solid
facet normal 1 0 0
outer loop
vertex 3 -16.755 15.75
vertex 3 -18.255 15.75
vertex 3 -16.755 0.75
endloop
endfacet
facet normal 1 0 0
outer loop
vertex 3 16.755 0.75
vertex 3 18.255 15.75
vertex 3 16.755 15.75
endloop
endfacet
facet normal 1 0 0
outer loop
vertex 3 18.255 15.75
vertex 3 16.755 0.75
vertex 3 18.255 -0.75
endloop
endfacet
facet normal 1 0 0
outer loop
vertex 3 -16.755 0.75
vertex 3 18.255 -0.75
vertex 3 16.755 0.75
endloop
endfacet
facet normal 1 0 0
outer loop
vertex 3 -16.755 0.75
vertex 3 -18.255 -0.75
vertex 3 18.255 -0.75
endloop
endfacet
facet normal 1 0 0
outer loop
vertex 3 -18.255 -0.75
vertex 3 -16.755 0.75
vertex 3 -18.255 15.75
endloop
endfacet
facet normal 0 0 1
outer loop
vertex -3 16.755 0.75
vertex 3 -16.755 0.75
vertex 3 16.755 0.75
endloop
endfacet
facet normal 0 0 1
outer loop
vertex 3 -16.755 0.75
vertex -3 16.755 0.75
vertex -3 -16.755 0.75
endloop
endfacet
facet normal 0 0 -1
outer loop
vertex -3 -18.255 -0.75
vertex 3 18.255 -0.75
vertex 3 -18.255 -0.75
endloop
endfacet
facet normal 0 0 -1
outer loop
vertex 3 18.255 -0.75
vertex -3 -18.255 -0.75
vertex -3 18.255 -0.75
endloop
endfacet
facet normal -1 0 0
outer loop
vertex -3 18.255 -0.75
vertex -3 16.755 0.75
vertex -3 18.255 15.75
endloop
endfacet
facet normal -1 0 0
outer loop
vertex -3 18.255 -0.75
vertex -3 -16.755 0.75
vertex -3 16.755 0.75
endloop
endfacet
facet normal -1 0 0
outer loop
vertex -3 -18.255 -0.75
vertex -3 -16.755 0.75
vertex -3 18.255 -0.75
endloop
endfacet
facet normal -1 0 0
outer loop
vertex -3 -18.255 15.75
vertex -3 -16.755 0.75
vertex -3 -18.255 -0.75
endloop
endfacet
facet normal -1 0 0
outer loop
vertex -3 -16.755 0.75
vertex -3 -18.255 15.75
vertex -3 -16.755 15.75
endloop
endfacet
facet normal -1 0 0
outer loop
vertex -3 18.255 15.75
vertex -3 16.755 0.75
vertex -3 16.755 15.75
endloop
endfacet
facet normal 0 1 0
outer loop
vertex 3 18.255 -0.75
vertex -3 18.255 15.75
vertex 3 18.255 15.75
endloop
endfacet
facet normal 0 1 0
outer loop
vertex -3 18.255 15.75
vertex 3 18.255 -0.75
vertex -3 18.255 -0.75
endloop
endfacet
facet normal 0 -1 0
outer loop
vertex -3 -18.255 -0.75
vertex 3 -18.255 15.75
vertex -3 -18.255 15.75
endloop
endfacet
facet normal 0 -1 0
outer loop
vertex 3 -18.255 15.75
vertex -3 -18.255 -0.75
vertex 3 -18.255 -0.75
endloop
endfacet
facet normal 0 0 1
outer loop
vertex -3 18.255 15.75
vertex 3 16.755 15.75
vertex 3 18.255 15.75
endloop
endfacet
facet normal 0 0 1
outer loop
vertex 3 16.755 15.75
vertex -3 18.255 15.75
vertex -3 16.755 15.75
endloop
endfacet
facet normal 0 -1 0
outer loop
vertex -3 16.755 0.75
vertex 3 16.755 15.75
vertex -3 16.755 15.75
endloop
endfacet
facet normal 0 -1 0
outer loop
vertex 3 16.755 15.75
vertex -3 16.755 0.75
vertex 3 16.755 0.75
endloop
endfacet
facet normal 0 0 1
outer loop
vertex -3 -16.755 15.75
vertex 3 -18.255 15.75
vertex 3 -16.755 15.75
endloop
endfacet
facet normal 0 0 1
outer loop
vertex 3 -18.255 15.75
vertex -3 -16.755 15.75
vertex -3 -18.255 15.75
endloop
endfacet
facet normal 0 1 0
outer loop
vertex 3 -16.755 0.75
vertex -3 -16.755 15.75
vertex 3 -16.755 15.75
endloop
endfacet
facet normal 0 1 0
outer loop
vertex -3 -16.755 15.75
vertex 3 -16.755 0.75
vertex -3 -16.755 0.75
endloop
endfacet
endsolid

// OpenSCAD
aa_w = 33.51;
button_w = 5.96 + 0.5;
t = 1.5;
d = 15;
w = 6; //button_w + 2*t;

difference(){
    cube([w, aa_w + 2*t, t], center=true);
    //translate([0, 1.5*button_w, 0])
    //cube([button_w, button_w, t], center=true);
    //translate([0, -1.5*button_w, 0])
    //cube([button_w, button_w, t], center=true);
}
translate([0, aa_w/2 + t/2, (d + t)/2])
cube([w, t, d], center=true);
translate([0, -aa_w/2 - t/2, (d + t)/2])
cube([w, t, d], center=true);
